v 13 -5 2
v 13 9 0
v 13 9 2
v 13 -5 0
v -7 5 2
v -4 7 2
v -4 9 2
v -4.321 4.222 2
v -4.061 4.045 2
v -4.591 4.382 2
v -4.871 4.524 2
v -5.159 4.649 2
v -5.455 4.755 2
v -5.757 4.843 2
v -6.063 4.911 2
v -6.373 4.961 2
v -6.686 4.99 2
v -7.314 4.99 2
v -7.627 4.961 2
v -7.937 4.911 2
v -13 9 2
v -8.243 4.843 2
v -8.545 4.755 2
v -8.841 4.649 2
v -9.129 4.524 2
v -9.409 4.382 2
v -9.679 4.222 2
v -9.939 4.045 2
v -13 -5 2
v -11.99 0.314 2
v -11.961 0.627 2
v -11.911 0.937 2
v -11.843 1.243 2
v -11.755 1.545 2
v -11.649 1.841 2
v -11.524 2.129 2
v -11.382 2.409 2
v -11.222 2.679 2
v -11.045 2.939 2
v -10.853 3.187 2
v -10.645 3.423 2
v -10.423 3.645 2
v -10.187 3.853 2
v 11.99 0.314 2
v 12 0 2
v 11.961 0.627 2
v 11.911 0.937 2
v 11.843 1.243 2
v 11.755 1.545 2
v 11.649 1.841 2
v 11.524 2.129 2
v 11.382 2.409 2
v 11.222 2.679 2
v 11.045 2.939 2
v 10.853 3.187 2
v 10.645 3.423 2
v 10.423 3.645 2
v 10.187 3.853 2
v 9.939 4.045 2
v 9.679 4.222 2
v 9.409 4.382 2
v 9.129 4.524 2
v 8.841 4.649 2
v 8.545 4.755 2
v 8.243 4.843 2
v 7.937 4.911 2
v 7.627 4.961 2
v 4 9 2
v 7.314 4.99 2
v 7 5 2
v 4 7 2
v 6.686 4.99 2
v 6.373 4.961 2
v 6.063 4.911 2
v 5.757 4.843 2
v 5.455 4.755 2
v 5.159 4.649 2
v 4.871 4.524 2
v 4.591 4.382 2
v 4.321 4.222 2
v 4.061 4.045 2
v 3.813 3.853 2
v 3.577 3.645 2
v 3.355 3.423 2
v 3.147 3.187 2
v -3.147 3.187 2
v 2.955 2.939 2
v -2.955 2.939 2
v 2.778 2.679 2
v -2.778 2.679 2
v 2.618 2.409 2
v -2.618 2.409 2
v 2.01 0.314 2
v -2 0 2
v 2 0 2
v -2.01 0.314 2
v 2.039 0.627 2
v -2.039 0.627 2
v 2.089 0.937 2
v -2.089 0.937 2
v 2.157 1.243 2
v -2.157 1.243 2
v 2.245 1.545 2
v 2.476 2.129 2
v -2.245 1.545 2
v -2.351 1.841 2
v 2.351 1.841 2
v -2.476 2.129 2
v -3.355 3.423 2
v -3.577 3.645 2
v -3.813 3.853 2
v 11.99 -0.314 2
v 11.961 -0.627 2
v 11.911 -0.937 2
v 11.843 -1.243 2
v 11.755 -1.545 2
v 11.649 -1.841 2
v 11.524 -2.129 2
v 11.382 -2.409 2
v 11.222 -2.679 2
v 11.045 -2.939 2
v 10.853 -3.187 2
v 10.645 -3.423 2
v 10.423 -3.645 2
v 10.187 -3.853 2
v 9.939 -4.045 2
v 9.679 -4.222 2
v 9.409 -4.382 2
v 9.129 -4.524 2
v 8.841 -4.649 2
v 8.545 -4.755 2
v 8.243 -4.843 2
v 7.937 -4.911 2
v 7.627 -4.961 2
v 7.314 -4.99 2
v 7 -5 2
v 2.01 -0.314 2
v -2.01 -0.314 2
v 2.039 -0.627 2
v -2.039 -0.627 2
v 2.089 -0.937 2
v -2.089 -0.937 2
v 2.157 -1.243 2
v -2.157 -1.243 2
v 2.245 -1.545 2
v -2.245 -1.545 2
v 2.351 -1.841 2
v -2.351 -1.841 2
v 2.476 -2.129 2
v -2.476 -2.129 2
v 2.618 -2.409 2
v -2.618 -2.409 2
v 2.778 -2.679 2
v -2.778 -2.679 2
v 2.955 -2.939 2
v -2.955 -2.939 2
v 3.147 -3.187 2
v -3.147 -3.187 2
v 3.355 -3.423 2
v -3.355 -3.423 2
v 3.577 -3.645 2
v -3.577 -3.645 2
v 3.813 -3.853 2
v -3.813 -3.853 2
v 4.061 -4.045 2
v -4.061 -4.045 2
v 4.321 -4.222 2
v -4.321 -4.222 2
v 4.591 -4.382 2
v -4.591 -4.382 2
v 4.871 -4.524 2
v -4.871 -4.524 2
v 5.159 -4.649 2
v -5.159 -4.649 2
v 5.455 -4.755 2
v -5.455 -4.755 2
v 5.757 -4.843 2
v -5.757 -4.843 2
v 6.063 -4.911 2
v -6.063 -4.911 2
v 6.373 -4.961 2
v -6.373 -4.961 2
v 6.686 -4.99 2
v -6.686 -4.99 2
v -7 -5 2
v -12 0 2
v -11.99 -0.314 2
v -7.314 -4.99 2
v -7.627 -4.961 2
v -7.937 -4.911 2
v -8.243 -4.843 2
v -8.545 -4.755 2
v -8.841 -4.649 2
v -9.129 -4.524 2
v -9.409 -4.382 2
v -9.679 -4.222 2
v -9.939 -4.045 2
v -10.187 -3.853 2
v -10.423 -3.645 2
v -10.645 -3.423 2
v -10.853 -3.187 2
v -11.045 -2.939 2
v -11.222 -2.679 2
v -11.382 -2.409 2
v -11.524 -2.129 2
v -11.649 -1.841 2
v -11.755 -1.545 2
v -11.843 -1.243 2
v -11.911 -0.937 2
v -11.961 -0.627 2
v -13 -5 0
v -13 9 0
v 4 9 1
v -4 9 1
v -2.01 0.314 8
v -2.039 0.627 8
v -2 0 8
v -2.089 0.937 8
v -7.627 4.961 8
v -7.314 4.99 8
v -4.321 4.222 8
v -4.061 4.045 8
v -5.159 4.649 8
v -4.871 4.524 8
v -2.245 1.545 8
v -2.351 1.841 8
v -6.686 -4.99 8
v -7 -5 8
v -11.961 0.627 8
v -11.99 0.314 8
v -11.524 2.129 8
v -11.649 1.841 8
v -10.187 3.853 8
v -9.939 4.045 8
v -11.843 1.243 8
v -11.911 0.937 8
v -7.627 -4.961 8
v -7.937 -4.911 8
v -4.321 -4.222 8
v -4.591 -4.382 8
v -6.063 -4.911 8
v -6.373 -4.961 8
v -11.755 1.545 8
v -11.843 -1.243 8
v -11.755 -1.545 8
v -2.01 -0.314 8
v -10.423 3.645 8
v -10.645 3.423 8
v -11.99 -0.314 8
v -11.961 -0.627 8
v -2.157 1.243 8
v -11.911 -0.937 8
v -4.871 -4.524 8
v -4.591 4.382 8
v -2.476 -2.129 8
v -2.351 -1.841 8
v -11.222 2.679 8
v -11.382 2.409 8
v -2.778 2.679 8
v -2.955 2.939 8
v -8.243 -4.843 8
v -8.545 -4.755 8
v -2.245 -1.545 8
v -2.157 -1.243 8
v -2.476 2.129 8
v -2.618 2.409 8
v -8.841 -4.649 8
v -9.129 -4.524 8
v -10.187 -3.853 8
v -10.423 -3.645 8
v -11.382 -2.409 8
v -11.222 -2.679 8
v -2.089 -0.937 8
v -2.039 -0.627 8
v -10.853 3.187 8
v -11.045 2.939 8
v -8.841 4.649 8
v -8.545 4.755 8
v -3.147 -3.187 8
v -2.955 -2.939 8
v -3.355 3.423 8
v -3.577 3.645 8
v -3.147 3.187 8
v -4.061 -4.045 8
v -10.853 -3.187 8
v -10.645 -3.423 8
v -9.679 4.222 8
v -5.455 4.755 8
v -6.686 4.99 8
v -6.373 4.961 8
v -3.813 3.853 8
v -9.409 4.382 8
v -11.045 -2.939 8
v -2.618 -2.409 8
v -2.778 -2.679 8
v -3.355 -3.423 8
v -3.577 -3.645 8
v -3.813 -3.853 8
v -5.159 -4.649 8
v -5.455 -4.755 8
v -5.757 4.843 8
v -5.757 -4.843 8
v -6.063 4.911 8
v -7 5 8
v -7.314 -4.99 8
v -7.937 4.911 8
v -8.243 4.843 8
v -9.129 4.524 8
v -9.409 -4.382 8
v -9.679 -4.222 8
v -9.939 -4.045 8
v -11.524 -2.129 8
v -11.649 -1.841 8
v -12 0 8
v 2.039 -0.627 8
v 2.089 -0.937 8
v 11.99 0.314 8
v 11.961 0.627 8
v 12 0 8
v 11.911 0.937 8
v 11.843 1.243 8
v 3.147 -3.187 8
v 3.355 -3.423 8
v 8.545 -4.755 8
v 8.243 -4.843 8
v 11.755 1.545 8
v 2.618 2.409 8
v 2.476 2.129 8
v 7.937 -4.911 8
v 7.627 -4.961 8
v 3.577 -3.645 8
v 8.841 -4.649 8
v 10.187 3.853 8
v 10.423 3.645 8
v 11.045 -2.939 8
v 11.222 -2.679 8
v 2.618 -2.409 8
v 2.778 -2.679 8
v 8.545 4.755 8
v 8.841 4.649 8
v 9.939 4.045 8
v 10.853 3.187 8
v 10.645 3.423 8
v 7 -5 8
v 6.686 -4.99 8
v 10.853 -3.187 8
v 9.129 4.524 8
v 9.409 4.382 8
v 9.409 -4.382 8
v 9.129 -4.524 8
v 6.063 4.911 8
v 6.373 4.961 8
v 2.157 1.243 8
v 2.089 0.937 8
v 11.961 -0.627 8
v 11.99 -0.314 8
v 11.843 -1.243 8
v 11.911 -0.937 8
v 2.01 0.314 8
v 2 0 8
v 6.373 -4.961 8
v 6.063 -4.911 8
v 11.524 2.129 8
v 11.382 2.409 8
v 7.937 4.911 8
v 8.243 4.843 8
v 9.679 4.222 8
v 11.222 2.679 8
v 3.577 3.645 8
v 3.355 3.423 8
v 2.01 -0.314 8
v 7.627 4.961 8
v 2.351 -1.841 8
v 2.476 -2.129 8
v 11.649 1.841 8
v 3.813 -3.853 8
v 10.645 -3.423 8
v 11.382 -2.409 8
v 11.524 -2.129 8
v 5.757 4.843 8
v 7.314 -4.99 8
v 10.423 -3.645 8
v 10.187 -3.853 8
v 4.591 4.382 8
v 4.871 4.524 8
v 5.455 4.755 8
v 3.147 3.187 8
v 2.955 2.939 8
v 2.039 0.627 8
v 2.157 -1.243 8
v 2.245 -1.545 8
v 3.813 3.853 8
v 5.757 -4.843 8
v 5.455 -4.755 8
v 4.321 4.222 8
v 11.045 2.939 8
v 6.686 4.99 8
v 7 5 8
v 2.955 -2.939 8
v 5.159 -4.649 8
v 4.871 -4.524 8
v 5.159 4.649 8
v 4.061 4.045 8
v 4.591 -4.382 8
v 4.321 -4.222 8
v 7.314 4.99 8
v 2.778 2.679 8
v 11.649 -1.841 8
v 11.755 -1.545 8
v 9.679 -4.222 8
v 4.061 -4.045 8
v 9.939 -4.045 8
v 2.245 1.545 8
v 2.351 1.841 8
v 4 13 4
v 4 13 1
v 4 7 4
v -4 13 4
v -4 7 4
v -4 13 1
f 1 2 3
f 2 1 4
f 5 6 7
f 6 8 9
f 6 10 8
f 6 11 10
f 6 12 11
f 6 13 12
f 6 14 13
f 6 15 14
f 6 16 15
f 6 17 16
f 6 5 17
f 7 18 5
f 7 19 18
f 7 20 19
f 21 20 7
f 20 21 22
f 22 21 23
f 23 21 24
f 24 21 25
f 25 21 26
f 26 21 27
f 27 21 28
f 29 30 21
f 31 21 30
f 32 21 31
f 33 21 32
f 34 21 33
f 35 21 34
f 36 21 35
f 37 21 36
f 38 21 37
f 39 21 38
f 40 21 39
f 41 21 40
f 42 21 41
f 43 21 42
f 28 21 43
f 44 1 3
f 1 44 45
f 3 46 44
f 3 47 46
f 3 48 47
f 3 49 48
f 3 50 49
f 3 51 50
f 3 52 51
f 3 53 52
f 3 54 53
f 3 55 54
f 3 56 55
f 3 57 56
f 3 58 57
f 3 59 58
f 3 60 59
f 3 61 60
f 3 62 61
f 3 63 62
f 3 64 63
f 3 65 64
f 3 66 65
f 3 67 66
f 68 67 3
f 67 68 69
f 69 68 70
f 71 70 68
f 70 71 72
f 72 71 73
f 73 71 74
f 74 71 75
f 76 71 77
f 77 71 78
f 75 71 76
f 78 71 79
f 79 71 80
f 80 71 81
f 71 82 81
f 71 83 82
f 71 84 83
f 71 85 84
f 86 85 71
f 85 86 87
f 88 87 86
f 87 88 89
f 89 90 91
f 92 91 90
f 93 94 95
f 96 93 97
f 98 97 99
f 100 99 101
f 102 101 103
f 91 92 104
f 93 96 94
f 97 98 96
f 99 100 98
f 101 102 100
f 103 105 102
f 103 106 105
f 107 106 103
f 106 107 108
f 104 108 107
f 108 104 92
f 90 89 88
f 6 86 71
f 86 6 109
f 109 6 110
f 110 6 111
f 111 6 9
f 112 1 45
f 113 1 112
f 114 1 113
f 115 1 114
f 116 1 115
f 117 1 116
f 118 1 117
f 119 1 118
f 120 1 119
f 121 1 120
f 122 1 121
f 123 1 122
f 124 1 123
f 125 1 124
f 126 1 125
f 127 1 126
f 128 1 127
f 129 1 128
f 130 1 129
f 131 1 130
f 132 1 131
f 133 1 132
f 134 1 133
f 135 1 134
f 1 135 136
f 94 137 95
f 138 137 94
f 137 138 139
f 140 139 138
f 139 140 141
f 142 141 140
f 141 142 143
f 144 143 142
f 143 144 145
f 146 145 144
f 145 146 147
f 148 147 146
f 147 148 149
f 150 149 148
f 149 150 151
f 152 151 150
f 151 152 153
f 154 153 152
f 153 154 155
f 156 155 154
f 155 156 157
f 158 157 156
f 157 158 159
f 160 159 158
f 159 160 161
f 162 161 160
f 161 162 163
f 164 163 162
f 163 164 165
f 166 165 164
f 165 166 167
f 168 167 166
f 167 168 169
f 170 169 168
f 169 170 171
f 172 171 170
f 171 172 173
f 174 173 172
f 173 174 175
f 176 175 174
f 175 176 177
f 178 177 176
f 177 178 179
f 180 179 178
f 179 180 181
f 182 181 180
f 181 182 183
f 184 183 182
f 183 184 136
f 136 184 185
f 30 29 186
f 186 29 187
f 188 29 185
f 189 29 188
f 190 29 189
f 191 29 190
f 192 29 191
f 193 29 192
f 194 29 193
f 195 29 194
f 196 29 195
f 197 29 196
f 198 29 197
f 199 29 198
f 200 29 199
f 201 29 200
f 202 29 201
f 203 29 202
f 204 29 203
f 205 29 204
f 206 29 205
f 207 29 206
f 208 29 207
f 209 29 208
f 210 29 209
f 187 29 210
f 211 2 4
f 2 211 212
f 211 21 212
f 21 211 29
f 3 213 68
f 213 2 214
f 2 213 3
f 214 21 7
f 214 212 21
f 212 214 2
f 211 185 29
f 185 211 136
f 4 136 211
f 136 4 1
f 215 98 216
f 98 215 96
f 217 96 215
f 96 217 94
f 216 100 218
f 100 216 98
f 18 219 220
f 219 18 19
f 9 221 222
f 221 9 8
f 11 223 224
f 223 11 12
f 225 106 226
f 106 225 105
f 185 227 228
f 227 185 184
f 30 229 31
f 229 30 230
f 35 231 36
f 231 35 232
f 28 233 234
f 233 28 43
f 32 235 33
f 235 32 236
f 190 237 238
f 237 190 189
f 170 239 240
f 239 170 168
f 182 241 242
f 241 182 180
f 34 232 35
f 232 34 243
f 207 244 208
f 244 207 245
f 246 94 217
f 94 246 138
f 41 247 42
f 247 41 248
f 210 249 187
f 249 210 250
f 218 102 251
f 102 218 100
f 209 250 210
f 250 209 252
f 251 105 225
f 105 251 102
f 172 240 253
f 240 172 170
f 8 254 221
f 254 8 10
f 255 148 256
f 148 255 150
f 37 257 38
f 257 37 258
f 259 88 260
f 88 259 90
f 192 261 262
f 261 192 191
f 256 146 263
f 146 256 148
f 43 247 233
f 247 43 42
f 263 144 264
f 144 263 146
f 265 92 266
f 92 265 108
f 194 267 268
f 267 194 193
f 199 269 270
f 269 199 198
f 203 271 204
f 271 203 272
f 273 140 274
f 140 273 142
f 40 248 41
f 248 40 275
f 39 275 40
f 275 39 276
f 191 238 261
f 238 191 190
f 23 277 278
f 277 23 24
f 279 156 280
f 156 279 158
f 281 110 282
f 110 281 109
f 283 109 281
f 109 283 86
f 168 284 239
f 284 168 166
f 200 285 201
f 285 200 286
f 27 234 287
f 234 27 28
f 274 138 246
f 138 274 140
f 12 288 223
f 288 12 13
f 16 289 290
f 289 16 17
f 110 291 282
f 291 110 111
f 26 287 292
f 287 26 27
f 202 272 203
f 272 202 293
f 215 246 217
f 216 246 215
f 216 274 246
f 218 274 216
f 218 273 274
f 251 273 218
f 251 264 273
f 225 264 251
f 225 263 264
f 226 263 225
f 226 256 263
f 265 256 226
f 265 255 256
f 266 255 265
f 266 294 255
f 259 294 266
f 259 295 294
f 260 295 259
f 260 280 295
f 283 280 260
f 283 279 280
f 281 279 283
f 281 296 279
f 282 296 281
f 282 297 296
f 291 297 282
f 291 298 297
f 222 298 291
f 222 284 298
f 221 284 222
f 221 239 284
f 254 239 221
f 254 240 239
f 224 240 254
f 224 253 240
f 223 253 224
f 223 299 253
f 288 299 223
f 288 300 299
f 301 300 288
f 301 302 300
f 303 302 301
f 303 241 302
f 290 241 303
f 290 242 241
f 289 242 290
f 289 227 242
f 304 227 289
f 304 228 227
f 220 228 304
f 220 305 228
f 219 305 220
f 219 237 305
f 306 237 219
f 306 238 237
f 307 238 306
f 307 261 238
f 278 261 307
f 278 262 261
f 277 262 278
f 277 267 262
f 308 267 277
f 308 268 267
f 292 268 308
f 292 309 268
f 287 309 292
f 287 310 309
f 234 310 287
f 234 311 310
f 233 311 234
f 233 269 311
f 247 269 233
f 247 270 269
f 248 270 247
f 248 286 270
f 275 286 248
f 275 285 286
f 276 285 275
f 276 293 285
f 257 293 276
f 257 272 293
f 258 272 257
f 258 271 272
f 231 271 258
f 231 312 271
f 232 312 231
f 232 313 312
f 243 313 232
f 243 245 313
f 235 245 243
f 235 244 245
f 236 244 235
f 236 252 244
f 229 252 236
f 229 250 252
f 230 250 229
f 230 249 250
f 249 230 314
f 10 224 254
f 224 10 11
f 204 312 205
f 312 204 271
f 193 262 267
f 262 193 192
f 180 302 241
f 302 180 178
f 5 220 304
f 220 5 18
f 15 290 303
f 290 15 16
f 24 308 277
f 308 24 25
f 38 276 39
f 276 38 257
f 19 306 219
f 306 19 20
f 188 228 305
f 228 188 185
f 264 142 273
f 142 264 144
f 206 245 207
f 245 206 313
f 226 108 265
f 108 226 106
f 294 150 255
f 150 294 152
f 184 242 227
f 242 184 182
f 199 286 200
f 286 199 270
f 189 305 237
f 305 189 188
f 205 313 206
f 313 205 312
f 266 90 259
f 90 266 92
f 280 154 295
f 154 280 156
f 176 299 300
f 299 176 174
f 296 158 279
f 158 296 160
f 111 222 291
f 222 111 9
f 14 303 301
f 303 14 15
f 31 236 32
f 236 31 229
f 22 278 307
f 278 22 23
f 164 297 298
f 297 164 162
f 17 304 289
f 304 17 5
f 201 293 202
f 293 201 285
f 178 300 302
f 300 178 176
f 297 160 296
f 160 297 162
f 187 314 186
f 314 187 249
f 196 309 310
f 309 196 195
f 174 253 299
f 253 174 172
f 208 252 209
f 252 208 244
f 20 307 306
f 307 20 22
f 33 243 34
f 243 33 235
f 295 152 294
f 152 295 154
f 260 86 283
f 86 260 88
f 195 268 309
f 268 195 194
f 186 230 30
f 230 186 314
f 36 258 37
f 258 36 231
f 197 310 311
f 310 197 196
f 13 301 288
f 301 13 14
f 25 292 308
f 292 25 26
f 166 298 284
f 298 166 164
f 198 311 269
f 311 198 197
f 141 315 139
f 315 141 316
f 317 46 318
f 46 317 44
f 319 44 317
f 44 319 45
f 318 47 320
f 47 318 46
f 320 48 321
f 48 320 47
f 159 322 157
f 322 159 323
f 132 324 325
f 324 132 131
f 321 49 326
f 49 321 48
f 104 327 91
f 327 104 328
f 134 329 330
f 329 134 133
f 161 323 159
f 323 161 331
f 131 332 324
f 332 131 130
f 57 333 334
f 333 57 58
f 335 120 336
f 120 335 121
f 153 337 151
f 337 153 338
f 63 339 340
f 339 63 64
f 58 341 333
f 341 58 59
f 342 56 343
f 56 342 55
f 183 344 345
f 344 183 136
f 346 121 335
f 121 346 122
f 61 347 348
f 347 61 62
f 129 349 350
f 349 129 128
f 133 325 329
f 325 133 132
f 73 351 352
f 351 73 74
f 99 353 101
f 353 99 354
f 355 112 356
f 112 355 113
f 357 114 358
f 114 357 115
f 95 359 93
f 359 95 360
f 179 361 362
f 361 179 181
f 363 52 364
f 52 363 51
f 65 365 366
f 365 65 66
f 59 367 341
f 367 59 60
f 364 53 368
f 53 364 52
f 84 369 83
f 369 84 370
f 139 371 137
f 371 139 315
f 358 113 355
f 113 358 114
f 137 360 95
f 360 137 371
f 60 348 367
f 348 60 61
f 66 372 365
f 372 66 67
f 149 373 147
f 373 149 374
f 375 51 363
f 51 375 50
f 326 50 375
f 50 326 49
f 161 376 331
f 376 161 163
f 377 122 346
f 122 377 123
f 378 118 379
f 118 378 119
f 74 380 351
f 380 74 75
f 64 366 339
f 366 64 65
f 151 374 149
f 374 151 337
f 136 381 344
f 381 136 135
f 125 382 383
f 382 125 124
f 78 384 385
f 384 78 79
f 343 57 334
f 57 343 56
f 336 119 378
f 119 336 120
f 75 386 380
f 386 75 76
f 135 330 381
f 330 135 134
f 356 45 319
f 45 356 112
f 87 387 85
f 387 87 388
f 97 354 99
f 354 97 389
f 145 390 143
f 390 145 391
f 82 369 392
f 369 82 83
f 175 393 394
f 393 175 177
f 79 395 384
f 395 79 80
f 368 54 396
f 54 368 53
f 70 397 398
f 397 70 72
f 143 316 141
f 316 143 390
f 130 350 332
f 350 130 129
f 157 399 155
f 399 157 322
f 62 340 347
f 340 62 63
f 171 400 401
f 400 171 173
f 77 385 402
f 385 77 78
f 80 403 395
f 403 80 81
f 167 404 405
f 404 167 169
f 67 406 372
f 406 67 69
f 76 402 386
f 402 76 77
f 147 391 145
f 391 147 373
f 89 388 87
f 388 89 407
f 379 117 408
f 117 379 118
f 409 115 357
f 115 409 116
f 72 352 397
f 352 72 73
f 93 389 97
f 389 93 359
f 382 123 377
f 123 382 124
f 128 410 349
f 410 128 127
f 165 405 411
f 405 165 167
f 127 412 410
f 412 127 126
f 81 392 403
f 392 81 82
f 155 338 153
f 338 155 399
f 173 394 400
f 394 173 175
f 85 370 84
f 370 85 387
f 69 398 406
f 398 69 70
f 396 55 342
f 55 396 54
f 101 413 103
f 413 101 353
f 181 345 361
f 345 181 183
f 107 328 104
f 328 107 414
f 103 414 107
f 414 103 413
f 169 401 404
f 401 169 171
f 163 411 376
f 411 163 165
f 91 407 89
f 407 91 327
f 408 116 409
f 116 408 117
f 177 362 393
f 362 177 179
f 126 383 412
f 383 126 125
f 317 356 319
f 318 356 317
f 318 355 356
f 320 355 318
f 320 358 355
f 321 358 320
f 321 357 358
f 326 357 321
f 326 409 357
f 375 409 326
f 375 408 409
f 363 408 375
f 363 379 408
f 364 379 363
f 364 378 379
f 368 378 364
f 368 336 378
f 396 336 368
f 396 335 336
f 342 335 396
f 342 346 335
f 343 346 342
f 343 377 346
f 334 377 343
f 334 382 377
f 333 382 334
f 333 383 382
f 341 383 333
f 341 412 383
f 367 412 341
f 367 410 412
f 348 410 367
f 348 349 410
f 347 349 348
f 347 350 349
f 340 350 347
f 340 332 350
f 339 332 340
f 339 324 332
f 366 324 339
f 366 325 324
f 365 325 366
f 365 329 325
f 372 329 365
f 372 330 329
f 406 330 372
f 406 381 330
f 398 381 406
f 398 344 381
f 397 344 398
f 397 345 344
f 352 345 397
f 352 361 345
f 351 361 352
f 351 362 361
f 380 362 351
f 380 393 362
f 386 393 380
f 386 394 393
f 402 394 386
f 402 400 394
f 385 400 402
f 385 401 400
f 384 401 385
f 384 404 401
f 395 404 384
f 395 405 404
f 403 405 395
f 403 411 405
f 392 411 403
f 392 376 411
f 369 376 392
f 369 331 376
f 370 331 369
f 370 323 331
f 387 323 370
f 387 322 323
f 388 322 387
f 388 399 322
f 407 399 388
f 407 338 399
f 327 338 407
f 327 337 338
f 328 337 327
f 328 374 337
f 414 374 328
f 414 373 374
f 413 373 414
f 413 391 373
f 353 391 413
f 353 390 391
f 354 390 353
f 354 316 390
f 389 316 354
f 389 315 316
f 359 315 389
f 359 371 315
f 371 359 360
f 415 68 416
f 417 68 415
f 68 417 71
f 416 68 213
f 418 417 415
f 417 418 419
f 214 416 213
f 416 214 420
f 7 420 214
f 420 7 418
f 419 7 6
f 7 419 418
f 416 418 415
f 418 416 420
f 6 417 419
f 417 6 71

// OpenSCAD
sonar();
//ir_line_sensor();

/**
 * Плата Arduino Uno (ChipKIT Uno32)
 */
module sonar() {
  // плата
  translate([0, 2, 1]) cube([26, 14, 2], center=true);
  
  translate([-7, 0, 2]) cylinder(r=5, h=6, $fn=100);
  translate([7, 0, 2]) cylinder(r=5, h=6, $fn=100);
  
  // штыри
  translate([0, 10, 2.5]) cube([8, 6, 3], center=true);
}

/**
 * Инфракрасный датчик линии
 */
module ir_line_sensor() {
  module ir() {
    cylinder(r=1, h=6, $fn=100);
    translate([0, 0, 6]) sphere(r=1, $fn=100);
  }
    
  // плата
  translate([0, 0, 1]) cube([6, 12, 2], center=true);
  
  // настроечный резистор
  translate([0, -2, 3]) cube([3, 3, 2], center=true);
  
  // штыри
  translate([0, -6, 2]) cube([3, 4, 2], center=true);
  
  // лампочки
  translate([1.5, 3, 2.5]) rotate([-90, 0, 0]) ir();
  translate([-1.5, 3, 2.5]) rotate([-90, 0, 0]) ir();
}
